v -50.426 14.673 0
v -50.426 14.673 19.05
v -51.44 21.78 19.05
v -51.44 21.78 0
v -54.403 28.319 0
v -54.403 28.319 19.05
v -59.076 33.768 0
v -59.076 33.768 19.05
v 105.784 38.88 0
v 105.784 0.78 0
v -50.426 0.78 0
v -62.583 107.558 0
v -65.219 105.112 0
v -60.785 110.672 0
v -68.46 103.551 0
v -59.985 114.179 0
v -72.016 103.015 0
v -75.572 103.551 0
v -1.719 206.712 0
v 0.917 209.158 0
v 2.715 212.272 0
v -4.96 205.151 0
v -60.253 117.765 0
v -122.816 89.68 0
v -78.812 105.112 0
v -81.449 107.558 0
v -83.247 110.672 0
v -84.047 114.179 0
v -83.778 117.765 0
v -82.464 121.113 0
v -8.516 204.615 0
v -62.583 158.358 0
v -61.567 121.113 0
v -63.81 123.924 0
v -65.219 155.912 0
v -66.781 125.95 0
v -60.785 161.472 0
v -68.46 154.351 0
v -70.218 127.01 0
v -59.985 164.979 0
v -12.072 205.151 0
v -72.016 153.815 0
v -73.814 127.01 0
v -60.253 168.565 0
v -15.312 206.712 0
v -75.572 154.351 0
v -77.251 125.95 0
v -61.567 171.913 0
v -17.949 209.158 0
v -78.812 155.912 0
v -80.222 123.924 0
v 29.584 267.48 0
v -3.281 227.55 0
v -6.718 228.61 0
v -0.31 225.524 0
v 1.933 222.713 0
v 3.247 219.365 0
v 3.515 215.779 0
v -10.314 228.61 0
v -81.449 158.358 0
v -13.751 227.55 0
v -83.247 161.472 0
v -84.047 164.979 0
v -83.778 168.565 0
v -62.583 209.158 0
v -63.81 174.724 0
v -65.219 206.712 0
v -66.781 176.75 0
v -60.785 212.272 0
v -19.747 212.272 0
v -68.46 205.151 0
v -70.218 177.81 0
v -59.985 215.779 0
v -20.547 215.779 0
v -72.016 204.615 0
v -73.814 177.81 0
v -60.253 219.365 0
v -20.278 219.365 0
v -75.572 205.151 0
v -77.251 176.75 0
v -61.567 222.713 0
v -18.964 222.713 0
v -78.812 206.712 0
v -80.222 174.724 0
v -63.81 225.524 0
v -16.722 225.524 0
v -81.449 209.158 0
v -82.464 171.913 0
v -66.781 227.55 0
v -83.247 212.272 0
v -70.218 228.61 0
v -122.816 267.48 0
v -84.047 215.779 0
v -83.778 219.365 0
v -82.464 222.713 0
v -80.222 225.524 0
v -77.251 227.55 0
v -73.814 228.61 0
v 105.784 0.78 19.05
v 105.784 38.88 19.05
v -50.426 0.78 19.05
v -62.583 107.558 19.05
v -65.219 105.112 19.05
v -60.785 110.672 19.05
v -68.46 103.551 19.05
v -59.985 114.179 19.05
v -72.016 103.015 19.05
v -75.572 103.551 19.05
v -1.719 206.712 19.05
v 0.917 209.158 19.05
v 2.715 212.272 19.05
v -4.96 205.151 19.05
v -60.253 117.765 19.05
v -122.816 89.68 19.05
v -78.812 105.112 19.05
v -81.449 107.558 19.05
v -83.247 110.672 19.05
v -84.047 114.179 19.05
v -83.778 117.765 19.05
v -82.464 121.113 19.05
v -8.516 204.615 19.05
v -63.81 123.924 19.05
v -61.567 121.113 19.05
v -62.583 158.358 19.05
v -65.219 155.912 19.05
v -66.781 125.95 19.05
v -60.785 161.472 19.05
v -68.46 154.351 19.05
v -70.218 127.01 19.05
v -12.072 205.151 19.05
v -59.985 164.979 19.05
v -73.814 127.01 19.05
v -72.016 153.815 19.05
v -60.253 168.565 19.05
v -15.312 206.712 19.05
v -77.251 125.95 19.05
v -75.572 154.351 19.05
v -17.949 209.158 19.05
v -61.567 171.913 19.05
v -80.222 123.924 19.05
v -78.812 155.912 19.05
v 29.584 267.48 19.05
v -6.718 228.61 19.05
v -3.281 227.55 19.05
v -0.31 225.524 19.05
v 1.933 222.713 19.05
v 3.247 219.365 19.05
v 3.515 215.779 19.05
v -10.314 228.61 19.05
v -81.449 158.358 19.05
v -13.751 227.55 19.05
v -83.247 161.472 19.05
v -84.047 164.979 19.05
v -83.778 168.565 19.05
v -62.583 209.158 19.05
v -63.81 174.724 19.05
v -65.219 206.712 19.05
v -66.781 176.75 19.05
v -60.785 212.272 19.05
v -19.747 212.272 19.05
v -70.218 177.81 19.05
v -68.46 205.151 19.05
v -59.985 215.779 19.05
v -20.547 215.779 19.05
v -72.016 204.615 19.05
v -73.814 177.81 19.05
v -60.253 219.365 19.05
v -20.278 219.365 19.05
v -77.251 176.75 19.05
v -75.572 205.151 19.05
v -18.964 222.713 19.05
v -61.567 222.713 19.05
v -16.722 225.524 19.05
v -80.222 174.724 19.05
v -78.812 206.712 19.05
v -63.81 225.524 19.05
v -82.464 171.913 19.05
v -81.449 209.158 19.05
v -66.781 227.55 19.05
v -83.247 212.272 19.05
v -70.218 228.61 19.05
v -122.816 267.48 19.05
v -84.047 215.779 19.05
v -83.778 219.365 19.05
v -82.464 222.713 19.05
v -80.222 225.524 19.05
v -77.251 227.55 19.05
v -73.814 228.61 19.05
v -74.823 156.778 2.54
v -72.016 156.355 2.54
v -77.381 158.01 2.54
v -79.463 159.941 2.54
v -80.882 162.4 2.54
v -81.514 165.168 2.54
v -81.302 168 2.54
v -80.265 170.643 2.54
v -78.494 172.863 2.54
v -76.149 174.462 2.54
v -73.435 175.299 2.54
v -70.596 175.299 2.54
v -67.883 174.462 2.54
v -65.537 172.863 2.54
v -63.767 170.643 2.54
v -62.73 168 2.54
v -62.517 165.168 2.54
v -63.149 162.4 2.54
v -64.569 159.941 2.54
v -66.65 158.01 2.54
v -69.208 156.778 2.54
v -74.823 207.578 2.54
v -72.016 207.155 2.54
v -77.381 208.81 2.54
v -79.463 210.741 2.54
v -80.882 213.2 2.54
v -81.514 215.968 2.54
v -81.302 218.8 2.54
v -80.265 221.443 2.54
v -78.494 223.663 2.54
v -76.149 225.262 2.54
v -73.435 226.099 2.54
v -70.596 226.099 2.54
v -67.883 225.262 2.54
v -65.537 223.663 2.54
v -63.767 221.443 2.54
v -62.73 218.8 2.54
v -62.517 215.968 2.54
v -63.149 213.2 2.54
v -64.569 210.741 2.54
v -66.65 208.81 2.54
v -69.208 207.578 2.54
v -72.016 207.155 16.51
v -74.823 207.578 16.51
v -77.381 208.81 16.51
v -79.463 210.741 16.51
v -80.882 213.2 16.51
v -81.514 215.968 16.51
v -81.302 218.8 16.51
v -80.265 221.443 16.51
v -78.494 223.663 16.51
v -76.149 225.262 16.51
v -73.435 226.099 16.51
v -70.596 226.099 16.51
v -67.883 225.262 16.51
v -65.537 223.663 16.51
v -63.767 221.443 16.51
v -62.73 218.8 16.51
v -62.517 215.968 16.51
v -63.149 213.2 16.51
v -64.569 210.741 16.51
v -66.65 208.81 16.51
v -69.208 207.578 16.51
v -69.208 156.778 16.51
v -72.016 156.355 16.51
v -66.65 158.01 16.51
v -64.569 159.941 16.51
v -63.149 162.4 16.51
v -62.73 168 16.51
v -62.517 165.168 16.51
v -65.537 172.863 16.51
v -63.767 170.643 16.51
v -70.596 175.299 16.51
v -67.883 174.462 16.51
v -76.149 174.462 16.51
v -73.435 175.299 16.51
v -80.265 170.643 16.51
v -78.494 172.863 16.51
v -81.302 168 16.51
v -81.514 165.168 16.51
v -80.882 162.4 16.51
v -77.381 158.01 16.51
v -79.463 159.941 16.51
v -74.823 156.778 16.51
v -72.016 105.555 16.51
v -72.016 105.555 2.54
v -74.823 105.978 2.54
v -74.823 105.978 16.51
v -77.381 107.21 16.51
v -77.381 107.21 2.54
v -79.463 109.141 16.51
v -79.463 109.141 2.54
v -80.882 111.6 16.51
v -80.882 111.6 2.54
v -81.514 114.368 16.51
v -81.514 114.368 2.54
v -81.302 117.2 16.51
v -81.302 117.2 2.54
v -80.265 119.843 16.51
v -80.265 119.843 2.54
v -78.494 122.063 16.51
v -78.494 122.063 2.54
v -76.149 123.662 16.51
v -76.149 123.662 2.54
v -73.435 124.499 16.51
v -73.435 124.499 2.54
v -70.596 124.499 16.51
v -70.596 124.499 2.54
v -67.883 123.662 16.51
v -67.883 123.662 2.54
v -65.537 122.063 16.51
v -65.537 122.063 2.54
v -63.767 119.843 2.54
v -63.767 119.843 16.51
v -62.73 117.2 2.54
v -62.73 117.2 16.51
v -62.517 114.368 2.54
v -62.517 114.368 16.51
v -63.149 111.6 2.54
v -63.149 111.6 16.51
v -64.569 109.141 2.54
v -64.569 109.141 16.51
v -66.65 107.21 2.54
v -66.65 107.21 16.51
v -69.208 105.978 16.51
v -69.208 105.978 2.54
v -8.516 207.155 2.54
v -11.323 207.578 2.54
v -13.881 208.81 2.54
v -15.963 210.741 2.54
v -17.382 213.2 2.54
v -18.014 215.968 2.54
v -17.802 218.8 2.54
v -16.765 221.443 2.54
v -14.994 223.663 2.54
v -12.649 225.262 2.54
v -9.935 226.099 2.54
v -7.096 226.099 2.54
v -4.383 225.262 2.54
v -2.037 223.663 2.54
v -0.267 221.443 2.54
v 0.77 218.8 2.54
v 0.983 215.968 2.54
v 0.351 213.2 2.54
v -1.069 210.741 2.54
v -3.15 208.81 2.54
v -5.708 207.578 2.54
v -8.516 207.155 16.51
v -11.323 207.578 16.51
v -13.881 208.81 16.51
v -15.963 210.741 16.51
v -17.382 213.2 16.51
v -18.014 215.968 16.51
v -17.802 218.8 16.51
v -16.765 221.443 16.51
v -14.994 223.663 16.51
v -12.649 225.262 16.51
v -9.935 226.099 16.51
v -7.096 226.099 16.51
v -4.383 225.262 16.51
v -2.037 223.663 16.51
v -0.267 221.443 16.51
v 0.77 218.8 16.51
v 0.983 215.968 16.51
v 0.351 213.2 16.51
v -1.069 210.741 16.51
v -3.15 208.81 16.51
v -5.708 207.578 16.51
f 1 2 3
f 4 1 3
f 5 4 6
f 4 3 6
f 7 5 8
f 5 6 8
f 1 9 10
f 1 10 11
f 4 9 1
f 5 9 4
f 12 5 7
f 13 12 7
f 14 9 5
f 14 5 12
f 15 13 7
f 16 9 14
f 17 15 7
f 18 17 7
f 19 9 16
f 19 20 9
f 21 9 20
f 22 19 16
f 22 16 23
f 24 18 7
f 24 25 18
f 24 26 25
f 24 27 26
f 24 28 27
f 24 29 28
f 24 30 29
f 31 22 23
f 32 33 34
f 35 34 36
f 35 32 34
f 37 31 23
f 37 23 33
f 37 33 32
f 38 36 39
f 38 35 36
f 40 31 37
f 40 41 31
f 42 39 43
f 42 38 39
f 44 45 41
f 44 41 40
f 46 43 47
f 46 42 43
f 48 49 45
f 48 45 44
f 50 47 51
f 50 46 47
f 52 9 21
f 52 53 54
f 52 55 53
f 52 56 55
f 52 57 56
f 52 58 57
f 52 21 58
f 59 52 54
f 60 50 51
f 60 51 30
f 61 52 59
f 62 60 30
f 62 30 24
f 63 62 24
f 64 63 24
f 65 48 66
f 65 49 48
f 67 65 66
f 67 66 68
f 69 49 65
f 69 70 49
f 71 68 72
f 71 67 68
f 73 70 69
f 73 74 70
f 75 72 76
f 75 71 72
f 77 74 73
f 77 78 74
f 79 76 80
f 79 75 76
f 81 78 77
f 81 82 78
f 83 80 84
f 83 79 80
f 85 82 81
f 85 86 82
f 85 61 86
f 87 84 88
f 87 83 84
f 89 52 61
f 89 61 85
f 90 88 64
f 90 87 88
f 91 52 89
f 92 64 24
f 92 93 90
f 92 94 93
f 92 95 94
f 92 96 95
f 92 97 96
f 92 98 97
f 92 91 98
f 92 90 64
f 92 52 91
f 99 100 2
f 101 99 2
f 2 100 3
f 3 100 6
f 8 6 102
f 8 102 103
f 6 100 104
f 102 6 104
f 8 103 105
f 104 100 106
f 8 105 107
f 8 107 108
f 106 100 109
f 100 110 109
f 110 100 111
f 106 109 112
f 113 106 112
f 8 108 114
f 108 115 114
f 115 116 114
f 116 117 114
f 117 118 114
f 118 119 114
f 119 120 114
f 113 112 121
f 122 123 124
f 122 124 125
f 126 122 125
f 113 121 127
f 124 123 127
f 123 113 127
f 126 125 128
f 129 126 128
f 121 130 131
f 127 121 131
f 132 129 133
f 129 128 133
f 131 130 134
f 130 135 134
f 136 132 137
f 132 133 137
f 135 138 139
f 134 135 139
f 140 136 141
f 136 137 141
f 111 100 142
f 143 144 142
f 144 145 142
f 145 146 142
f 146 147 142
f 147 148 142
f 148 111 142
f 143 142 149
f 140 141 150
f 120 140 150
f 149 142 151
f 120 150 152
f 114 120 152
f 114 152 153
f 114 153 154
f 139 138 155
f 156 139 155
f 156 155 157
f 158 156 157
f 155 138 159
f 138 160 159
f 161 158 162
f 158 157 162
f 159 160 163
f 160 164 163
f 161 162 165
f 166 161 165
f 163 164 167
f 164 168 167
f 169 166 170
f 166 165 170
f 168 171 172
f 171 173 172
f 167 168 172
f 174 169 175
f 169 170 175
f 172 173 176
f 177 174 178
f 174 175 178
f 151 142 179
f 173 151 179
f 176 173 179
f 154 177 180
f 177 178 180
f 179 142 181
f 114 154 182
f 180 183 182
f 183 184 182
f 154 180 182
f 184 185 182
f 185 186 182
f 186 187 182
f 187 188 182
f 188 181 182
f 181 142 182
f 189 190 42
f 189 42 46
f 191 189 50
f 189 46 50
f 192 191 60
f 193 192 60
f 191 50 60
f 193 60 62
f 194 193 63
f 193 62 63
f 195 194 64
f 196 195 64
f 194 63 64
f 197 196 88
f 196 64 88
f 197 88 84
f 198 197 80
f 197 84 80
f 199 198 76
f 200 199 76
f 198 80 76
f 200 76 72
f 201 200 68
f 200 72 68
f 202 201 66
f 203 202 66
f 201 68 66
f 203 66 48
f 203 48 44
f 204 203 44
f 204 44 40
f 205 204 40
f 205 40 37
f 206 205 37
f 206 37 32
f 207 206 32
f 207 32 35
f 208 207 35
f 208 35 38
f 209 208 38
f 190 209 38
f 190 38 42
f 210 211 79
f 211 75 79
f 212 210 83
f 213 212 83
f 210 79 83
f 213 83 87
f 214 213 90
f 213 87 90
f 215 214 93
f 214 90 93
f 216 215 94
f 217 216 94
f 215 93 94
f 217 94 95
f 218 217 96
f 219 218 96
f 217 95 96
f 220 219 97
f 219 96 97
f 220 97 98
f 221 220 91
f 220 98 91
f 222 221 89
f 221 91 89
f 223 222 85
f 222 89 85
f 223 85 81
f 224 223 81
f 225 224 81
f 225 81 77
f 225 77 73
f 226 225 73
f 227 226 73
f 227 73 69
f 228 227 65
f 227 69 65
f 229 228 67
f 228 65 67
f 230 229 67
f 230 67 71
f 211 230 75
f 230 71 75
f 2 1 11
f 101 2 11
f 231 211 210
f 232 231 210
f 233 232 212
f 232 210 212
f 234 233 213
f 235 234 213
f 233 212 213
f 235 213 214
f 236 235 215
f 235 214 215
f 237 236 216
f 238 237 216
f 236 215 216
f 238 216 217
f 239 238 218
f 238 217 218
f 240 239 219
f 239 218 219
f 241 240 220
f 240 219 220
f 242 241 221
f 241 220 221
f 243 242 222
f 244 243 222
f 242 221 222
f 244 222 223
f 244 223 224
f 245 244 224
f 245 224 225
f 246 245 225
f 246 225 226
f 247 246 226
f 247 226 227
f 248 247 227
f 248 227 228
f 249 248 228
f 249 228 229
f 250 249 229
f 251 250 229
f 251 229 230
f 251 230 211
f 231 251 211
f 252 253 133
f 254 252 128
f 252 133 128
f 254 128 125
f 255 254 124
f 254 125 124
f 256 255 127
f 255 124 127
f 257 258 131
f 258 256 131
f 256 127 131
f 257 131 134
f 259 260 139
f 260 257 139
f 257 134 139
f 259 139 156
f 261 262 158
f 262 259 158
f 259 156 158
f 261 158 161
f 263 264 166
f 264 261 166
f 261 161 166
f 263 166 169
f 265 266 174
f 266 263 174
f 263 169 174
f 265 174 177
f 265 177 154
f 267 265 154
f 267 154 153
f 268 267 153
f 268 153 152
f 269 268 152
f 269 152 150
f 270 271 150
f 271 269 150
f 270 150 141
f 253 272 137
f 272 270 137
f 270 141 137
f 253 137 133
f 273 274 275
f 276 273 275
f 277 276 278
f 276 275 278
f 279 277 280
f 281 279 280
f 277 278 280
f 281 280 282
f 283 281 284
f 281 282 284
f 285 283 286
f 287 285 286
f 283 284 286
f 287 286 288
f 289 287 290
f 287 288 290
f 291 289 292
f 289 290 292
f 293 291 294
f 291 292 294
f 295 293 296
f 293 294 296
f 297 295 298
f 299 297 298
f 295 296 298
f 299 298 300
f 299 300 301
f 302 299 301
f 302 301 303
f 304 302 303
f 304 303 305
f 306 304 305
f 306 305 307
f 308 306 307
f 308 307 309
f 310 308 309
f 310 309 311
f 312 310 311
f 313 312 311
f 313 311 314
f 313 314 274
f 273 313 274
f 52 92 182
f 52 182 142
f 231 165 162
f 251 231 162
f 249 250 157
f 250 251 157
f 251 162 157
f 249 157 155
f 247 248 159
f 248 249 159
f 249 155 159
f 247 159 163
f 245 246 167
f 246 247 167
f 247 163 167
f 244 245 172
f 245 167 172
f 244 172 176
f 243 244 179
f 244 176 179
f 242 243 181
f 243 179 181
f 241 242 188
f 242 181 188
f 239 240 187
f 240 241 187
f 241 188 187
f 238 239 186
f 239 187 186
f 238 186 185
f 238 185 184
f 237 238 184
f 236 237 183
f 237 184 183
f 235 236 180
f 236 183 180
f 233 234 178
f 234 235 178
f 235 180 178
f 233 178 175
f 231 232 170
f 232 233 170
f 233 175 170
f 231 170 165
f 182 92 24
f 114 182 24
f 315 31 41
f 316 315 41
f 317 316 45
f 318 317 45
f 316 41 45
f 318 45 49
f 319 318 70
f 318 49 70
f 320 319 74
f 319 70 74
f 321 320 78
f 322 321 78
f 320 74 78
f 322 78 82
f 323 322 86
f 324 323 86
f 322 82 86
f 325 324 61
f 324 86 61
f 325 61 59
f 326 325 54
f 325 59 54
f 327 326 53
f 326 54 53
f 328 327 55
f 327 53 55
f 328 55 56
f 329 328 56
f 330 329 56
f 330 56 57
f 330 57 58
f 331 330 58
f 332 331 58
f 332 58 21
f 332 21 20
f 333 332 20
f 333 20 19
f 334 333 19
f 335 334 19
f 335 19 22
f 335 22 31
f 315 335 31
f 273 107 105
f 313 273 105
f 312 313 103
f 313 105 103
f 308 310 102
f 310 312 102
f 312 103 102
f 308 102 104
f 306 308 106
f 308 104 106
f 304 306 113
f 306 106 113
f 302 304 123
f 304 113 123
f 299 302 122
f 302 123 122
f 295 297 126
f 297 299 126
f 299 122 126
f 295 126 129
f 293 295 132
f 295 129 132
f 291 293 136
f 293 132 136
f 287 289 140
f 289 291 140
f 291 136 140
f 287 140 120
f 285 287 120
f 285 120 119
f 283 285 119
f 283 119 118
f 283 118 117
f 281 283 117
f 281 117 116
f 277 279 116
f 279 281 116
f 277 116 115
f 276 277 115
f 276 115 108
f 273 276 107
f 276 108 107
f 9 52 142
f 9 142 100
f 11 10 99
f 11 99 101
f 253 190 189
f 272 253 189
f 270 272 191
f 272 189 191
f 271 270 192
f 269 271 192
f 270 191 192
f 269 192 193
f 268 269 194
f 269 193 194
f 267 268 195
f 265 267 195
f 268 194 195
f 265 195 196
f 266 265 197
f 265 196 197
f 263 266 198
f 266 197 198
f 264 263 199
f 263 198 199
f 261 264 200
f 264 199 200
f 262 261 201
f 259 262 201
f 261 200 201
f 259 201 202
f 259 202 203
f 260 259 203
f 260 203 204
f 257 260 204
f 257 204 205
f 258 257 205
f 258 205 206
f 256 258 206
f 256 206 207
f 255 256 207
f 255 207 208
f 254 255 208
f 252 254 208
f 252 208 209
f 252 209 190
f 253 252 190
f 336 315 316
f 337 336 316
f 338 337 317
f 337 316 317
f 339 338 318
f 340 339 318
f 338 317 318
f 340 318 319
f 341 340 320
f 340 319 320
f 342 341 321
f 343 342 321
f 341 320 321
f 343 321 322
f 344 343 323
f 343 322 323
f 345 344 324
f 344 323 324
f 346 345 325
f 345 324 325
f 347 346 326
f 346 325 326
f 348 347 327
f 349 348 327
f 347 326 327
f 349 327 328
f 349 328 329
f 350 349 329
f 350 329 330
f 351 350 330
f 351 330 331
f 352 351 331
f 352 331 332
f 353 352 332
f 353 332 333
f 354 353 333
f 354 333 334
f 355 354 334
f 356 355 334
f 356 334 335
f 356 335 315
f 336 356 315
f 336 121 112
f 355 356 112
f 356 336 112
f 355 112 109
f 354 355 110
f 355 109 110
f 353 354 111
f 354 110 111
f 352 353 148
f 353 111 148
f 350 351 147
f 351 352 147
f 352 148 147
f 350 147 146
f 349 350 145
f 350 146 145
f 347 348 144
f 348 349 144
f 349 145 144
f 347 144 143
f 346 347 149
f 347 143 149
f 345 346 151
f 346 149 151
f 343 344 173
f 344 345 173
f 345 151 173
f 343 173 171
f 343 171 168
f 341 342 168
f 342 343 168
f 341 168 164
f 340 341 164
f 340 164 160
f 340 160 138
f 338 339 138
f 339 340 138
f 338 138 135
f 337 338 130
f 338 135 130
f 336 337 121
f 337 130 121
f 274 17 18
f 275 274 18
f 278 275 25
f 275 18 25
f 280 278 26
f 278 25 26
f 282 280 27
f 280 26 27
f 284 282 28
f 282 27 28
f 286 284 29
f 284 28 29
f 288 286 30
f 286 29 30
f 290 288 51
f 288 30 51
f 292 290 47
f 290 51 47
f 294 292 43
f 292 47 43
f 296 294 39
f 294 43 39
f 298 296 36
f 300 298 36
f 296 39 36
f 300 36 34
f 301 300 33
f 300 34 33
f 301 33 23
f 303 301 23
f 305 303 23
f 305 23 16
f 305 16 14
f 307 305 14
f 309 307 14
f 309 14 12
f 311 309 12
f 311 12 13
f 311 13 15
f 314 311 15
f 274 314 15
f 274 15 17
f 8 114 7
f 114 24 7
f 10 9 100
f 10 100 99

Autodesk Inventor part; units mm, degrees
ref_plane "YZ Plane" through (0, 0, 0) normal (1, 0, 0) x (0, 1, 0)
ref_plane "XZ Plane" through (0, 0, 0) normal (0, 1, 0) x (-1, 0, 0)
ref_plane "XY Plane" through (0, 0, 0) normal (0, 0, 1) x (1, 0, 0)
sketch "Sketch1" plane through (0, 0, 0) normal (0, 0, 1) x (1, 0, 0)
  line L0 (-50.4258, 38.8802) -> (105.7842, 38.8802)
  line L1 (105.7842, 38.8802) -> (105.7842, 0.7802)
  line L2 (105.7842, 0.7802) -> (-50.4258, 0.7802)
  line L3 (-50.4258, 0.7802) -> (-50.4258, 38.8802)
  line L4 (-122.8158, 267.4802) -> (29.5842, 267.4802)
  line L5 (29.5842, 267.4802) -> (29.5842, 165.8802)
  line L6 (29.5842, 165.8802) -> (-122.8158, 165.8802)
  line L7 (-122.8158, 165.8802) -> (-122.8158, 267.4802)
  line L8 (29.5842, 267.4802) -> (105.7842, 38.8802)
  line L9 (-122.8158, 165.8802) -> (-50.4258, 102.3802)
  line L10 (-50.4258, 102.3802) -> (-50.4258, 38.8802)
  point P0 (0, 0)
  dimension "d0" = 156.21
  dimension "d1" = 38.1
  dimension "d2" = 101.6
  dimension "d3" = 152.4
  dimension "d4" = 228.6
  dimension "d5" = 76.2
  dimension "d19" = 63.5
extrude "Extrusion1" add sketch "Sketch1" along normal blind 19.05
sketch "Sketch5" plane through (0, 0, 0) normal (0, 0, -1) x (-1, 0, 0)
  line L0 (50.4258, 102.3802) -> (50.4258, 0.7802) projected
  line L1 (122.8158, 165.8802) -> (50.4258, 102.3802) projected
  line L2 (122.8158, 165.8802) -> (122.8158, 89.6802)
  line L3 (122.8158, 89.6802) -> (50.4258, 26.1802)
  point P0 (0, 0)
  dimension "d40" = 76.2
  dimension "d41" = 76.2
extrude "Extrusion3" add sketch "Sketch5" against normal blind 19.05
sketch "Sketch6" plane through (0, 0, 19.05) normal (0, 0, 1) x (1, 0, 0)
  line L0 (-122.8158, 267.4802) -> (29.5842, 267.4802) projected
  line L1 (-122.8158, 89.6802) -> (-122.8158, 267.4802) projected
  point P0 (0, 0)
  point P1 (-72.0158, 216.6802)
  point P2 (-8.5158, 216.6802)
  point P3 (-72.0158, 115.0802)
  point P4 (-72.0158, 165.8802)
  dimension "d44" = 50.8
  dimension "d45" = 50.8
  dimension "d46" = 50.8
  dimension "d47" = 50.8
  dimension "d48" = 50.8
  dimension "d49" = 50.8
  dimension "d50" = 50.8
  dimension "d51" = 63.5
hole "Hole3" at (-72.0158, 216.6802, 19.05) at (-8.5158, 216.6802, 19.05) at (-72.0158, 115.0802, 19.05) at (-72.0158, 165.8802, 19.05) direction (0, 0, -1) diameter 19.05 end through all
fillet "Fillet1" radius 25.4 1 edges at (-50.4258, 26.1802, 9.525)
chamfer "Chamfer1" distance 2.54 angle 45 8 edges at (-8.5158, 226.2052, 0) (-72.0158, 226.2052, 0) (-72.0158, 175.4052, 0) (-72.0158, 124.6052, 0) (-72.0158, 226.2052, 19.05) (-8.5158, 226.2052, 19.05) (-72.0158, 175.4052, 19.05) (-72.0158, 124.6052, 19.05)
equation "\"d45\" = d44"
equation "\"d46\" = d44"
equation "\"d47\" = d44"
equation "\"d48\" = d44"
properties part number "Uprights"
